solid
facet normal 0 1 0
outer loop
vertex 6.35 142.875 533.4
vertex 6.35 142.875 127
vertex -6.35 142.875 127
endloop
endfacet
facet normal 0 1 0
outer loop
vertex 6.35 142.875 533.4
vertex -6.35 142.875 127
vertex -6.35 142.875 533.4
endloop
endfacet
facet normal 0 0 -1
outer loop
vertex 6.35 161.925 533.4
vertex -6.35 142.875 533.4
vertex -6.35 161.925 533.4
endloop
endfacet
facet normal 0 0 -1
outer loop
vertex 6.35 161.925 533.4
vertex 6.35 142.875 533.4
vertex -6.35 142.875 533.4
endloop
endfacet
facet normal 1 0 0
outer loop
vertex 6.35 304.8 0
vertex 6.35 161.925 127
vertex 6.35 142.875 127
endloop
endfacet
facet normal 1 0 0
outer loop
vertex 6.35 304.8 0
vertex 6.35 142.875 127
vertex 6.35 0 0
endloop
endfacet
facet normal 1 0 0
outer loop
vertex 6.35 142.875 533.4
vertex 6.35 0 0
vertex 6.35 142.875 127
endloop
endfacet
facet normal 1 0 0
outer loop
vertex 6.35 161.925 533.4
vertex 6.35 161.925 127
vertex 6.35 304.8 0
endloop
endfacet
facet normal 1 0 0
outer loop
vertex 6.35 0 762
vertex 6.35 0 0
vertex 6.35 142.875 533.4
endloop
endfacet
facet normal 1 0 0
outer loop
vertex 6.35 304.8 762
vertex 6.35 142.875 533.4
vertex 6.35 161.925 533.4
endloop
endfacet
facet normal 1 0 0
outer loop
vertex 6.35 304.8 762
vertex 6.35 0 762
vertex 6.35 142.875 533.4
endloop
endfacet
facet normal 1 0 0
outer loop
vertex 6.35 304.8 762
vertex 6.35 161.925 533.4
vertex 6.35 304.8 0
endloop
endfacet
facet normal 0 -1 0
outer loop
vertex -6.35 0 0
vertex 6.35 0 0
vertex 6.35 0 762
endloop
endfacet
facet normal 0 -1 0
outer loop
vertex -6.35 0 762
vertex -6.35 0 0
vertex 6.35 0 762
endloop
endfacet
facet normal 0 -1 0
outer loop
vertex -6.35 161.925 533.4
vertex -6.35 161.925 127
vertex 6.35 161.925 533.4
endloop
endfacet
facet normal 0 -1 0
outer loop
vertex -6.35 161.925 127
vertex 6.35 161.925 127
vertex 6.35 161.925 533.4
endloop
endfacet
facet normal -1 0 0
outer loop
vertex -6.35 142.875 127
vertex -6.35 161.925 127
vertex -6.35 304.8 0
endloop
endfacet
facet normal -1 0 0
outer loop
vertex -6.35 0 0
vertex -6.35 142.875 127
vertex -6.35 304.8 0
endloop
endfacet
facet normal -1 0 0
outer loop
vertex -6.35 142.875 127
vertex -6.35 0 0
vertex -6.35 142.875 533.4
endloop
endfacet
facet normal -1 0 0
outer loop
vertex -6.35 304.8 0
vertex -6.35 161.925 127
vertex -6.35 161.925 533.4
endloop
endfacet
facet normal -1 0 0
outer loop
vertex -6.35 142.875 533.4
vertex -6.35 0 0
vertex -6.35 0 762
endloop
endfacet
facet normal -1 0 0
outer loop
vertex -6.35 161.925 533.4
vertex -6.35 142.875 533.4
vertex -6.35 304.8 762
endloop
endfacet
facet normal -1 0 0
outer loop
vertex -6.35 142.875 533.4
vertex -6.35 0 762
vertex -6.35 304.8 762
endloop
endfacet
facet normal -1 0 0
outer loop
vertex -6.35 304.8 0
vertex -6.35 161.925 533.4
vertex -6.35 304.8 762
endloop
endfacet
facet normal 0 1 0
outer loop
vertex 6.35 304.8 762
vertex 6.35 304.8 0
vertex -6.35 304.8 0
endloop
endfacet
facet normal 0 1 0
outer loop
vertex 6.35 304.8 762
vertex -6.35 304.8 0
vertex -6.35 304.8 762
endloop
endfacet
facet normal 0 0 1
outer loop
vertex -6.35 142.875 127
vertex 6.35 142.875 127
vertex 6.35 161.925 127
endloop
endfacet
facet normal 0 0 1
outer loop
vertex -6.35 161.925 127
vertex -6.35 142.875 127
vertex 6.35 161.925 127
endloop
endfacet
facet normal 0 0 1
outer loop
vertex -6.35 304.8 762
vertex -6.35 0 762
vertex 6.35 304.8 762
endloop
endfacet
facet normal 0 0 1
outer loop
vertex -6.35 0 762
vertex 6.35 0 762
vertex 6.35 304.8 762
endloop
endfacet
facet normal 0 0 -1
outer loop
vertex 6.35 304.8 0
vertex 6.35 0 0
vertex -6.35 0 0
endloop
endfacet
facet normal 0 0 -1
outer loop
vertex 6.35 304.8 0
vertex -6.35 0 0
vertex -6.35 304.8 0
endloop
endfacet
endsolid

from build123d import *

# Parameters (mm, degrees)
F0_W     = 304.8
F0_H     = 762
F0_W_2   = 19.05
F0_H_2   = 406.4
F1_DEPTH = 6.35


with BuildPart() as f1:
    # F0 (on Right) → F1 (new body, symmetric)
    with BuildSketch(Plane.YZ):
        with Locations((152.4, 381)):
            Rectangle(F0_W, F0_H)
        with Locations((152.4, 330.2)):
            Rectangle(F0_W_2, F0_H_2, mode=Mode.SUBTRACT)
    extrude(amount=F1_DEPTH, both=True)


solid = f1.part
